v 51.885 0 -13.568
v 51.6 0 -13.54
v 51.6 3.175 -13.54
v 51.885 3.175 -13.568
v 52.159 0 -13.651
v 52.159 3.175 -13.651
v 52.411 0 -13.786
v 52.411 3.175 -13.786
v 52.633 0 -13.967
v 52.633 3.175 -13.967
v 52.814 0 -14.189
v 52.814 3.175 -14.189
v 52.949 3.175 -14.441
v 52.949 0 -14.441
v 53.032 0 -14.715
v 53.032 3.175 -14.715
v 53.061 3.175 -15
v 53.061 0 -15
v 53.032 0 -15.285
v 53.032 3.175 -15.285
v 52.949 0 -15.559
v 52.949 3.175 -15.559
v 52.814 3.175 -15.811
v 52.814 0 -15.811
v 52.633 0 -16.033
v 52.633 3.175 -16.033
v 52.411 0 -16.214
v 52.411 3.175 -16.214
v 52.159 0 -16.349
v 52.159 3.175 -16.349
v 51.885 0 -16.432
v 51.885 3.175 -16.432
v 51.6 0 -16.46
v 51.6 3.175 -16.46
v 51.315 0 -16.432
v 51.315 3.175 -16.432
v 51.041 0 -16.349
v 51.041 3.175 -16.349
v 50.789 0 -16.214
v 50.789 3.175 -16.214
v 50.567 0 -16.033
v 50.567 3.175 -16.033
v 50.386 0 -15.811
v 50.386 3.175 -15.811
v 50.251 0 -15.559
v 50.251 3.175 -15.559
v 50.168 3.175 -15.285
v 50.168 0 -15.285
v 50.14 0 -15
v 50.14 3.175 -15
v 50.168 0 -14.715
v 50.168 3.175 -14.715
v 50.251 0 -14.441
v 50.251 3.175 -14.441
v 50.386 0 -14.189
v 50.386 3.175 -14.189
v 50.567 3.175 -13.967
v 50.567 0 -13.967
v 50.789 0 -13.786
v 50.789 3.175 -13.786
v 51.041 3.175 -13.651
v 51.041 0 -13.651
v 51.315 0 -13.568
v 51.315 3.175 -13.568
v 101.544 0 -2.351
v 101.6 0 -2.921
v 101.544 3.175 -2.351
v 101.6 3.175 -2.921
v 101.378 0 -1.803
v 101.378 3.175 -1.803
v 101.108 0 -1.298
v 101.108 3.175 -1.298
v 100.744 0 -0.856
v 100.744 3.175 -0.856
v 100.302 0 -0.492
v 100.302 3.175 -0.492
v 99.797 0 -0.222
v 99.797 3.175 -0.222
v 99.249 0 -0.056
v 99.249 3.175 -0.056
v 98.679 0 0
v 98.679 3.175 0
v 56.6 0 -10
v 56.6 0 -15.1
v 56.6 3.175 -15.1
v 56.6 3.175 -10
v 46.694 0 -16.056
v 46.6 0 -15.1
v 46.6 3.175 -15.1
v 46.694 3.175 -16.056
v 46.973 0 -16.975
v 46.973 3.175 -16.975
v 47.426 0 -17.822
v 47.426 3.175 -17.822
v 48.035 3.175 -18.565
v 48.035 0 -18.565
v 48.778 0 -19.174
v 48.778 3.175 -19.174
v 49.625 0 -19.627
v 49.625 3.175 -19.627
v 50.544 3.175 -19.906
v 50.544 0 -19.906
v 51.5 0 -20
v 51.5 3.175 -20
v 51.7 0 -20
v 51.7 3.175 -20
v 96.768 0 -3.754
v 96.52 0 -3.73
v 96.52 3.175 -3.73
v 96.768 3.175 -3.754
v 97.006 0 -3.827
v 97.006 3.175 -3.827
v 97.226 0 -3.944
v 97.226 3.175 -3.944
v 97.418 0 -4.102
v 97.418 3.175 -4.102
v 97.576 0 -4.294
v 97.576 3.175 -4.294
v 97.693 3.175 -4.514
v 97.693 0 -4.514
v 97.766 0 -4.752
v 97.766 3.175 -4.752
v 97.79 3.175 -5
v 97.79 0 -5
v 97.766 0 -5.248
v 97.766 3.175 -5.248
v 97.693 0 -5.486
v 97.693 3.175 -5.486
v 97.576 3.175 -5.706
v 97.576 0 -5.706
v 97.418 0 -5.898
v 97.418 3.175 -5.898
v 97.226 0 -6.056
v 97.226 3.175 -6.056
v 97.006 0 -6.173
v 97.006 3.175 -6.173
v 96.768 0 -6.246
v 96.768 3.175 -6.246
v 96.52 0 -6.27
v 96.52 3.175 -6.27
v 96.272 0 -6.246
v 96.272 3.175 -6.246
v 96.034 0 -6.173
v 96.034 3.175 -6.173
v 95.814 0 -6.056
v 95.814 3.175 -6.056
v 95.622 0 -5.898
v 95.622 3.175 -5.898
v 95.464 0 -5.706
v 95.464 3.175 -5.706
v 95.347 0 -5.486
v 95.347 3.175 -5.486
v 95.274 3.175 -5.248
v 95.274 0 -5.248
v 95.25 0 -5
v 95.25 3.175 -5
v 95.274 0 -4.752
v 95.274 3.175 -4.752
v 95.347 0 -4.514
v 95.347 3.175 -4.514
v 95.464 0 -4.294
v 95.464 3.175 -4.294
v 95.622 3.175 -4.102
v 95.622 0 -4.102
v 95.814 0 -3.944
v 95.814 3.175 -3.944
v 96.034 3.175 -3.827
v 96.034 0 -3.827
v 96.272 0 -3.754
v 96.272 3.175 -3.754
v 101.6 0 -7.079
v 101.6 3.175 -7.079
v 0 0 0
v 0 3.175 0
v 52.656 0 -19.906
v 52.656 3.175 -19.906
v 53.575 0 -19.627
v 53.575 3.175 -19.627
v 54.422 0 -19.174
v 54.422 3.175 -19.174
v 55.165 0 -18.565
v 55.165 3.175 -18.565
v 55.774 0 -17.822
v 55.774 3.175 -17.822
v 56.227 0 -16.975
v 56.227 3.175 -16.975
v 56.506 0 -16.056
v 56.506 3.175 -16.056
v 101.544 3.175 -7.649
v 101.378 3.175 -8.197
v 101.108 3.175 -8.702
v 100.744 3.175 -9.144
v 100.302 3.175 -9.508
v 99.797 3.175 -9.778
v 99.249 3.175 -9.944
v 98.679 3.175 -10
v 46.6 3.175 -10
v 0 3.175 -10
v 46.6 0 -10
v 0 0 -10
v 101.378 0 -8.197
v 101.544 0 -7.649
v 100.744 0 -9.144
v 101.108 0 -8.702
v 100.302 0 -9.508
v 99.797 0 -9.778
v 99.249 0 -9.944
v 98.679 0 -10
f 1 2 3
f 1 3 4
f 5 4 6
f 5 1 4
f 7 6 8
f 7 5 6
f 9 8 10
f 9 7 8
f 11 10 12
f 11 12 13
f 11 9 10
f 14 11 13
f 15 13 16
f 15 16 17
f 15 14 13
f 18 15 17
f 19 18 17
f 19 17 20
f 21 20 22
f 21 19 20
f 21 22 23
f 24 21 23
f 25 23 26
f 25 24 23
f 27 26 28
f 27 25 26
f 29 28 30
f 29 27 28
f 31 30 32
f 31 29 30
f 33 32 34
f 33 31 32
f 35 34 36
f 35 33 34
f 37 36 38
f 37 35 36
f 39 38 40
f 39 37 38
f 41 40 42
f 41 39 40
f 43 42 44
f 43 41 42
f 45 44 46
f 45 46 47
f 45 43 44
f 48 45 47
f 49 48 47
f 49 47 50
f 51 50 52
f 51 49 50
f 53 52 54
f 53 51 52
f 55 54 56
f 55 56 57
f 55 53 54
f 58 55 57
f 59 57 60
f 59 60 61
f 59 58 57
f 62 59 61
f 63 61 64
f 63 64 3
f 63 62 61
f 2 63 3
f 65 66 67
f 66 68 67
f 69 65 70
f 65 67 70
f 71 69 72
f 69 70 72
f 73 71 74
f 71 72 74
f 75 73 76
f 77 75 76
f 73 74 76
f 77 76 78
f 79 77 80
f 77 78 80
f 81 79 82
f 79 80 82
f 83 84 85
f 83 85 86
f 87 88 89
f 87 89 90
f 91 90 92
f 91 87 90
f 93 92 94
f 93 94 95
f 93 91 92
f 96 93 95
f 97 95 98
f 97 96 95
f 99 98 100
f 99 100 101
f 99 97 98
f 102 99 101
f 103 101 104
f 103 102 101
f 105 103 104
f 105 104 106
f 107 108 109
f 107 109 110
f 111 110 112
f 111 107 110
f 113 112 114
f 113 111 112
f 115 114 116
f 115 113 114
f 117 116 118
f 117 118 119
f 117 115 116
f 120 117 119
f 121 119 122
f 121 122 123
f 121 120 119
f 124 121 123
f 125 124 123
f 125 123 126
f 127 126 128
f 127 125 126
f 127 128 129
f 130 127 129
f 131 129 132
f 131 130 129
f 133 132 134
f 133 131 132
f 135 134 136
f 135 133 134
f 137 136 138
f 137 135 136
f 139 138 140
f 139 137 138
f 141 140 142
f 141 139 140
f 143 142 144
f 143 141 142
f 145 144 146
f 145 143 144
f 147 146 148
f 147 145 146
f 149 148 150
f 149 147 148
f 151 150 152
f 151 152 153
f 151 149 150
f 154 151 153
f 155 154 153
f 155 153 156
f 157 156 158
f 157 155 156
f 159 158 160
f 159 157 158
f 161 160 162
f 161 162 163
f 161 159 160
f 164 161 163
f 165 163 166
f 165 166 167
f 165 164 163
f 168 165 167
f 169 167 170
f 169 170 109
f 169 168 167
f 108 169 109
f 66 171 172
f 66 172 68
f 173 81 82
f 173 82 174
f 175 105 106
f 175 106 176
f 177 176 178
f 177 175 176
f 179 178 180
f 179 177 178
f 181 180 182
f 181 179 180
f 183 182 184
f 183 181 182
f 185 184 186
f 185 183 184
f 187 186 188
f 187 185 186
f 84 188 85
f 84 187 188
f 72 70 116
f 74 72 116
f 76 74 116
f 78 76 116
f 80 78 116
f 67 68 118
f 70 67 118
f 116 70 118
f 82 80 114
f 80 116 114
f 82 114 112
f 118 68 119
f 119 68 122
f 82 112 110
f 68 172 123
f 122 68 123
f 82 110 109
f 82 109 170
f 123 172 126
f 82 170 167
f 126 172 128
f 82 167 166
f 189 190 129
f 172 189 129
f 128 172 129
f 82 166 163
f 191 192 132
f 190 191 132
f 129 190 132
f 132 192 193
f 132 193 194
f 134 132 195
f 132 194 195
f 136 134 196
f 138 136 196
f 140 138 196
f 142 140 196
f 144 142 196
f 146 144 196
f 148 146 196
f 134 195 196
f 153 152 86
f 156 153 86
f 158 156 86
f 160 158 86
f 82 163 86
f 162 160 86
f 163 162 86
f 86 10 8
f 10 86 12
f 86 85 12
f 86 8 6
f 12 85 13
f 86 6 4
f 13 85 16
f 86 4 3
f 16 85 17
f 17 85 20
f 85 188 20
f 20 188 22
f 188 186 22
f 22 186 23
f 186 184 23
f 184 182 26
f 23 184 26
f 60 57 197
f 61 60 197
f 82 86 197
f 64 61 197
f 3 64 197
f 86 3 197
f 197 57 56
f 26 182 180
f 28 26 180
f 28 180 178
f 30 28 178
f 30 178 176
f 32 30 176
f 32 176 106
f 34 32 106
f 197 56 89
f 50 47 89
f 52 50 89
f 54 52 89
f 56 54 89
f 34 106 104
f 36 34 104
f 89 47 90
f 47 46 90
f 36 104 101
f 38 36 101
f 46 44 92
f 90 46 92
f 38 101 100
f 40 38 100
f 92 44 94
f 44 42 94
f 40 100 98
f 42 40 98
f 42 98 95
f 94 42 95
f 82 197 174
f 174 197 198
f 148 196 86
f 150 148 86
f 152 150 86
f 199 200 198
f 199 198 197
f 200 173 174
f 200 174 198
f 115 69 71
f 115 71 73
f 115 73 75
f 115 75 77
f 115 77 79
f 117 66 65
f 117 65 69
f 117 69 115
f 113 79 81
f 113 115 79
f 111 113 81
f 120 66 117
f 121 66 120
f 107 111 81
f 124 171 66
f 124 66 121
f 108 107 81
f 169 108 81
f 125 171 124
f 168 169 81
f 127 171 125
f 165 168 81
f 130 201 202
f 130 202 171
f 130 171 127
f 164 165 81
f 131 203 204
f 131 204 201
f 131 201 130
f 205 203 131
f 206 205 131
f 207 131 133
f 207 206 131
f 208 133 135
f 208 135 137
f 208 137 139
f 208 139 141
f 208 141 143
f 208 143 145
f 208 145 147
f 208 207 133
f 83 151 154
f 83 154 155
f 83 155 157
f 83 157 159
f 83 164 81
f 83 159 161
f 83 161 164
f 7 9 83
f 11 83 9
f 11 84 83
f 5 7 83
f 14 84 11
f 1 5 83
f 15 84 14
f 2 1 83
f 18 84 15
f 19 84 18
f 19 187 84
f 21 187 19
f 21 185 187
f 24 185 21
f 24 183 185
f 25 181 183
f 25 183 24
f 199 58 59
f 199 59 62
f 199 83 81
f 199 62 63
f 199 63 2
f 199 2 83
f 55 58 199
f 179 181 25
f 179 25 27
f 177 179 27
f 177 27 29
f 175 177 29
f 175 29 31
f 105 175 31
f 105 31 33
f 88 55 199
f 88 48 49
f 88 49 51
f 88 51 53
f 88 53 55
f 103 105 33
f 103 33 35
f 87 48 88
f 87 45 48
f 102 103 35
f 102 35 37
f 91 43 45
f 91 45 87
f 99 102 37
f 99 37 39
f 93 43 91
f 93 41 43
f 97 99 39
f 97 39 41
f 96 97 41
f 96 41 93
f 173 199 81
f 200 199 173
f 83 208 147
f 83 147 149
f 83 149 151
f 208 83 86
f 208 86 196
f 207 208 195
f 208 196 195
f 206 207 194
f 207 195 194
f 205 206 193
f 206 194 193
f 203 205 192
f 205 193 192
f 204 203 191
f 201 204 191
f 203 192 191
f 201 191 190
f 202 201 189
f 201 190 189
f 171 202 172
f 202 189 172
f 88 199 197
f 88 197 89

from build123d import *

# Parameters (mm, degrees)
SKETCH1_R           = 1.4605
SKETCH1_R_2         = 1.27
BOSS_EXTRUDE1_DEPTH = 3.175
FILLET1_R           = 2.921


with BuildPart() as part:
    # Sketch1 → Boss-Extrude1 (new body)
    with BuildSketch(Plane(origin=(0, 0, 0), x_dir=(1, 0, 0), z_dir=(0, 1, 0))):
        with BuildLine():
            Line((56.6, 10), (101.6, 10))
            Line((101.6, 10), (101.6, 0))
            Line((101.6, 0), (0, 0))
            Line((0, 0), (0, 10))
            Line((0, 10), (46.6, 10))
            Line((46.6, 10), (46.6, 15.1))
            ThreePointArc((46.6, 15.1), (48.035176772, 18.564823228), (51.5, 20))
            Line((51.5, 20), (51.7, 20))
            ThreePointArc((51.7, 20), (55.164823228, 18.564823228), (56.6, 15.1))
            Line((56.6, 15.1), (56.6, 10))
        make_face()
        with Locations(Location((51.6, 15, 0), (0, 0, 270))):
            Circle(SKETCH1_R, mode=Mode.SUBTRACT)
        with Locations(Location((96.52, 5, 0), (0, 0, 270))):
            Circle(SKETCH1_R_2, mode=Mode.SUBTRACT)
    extrude(amount=BOSS_EXTRUDE1_DEPTH)

    # Fillet1
    fillet1_edges = [part.edges().sort_by_distance(p)[0] for p in [
        (101.6, 1.5875, -10),
        (101.6, 1.5875, 0),
    ]]
    fillet(fillet1_edges, radius=FILLET1_R)


solid = part.part
